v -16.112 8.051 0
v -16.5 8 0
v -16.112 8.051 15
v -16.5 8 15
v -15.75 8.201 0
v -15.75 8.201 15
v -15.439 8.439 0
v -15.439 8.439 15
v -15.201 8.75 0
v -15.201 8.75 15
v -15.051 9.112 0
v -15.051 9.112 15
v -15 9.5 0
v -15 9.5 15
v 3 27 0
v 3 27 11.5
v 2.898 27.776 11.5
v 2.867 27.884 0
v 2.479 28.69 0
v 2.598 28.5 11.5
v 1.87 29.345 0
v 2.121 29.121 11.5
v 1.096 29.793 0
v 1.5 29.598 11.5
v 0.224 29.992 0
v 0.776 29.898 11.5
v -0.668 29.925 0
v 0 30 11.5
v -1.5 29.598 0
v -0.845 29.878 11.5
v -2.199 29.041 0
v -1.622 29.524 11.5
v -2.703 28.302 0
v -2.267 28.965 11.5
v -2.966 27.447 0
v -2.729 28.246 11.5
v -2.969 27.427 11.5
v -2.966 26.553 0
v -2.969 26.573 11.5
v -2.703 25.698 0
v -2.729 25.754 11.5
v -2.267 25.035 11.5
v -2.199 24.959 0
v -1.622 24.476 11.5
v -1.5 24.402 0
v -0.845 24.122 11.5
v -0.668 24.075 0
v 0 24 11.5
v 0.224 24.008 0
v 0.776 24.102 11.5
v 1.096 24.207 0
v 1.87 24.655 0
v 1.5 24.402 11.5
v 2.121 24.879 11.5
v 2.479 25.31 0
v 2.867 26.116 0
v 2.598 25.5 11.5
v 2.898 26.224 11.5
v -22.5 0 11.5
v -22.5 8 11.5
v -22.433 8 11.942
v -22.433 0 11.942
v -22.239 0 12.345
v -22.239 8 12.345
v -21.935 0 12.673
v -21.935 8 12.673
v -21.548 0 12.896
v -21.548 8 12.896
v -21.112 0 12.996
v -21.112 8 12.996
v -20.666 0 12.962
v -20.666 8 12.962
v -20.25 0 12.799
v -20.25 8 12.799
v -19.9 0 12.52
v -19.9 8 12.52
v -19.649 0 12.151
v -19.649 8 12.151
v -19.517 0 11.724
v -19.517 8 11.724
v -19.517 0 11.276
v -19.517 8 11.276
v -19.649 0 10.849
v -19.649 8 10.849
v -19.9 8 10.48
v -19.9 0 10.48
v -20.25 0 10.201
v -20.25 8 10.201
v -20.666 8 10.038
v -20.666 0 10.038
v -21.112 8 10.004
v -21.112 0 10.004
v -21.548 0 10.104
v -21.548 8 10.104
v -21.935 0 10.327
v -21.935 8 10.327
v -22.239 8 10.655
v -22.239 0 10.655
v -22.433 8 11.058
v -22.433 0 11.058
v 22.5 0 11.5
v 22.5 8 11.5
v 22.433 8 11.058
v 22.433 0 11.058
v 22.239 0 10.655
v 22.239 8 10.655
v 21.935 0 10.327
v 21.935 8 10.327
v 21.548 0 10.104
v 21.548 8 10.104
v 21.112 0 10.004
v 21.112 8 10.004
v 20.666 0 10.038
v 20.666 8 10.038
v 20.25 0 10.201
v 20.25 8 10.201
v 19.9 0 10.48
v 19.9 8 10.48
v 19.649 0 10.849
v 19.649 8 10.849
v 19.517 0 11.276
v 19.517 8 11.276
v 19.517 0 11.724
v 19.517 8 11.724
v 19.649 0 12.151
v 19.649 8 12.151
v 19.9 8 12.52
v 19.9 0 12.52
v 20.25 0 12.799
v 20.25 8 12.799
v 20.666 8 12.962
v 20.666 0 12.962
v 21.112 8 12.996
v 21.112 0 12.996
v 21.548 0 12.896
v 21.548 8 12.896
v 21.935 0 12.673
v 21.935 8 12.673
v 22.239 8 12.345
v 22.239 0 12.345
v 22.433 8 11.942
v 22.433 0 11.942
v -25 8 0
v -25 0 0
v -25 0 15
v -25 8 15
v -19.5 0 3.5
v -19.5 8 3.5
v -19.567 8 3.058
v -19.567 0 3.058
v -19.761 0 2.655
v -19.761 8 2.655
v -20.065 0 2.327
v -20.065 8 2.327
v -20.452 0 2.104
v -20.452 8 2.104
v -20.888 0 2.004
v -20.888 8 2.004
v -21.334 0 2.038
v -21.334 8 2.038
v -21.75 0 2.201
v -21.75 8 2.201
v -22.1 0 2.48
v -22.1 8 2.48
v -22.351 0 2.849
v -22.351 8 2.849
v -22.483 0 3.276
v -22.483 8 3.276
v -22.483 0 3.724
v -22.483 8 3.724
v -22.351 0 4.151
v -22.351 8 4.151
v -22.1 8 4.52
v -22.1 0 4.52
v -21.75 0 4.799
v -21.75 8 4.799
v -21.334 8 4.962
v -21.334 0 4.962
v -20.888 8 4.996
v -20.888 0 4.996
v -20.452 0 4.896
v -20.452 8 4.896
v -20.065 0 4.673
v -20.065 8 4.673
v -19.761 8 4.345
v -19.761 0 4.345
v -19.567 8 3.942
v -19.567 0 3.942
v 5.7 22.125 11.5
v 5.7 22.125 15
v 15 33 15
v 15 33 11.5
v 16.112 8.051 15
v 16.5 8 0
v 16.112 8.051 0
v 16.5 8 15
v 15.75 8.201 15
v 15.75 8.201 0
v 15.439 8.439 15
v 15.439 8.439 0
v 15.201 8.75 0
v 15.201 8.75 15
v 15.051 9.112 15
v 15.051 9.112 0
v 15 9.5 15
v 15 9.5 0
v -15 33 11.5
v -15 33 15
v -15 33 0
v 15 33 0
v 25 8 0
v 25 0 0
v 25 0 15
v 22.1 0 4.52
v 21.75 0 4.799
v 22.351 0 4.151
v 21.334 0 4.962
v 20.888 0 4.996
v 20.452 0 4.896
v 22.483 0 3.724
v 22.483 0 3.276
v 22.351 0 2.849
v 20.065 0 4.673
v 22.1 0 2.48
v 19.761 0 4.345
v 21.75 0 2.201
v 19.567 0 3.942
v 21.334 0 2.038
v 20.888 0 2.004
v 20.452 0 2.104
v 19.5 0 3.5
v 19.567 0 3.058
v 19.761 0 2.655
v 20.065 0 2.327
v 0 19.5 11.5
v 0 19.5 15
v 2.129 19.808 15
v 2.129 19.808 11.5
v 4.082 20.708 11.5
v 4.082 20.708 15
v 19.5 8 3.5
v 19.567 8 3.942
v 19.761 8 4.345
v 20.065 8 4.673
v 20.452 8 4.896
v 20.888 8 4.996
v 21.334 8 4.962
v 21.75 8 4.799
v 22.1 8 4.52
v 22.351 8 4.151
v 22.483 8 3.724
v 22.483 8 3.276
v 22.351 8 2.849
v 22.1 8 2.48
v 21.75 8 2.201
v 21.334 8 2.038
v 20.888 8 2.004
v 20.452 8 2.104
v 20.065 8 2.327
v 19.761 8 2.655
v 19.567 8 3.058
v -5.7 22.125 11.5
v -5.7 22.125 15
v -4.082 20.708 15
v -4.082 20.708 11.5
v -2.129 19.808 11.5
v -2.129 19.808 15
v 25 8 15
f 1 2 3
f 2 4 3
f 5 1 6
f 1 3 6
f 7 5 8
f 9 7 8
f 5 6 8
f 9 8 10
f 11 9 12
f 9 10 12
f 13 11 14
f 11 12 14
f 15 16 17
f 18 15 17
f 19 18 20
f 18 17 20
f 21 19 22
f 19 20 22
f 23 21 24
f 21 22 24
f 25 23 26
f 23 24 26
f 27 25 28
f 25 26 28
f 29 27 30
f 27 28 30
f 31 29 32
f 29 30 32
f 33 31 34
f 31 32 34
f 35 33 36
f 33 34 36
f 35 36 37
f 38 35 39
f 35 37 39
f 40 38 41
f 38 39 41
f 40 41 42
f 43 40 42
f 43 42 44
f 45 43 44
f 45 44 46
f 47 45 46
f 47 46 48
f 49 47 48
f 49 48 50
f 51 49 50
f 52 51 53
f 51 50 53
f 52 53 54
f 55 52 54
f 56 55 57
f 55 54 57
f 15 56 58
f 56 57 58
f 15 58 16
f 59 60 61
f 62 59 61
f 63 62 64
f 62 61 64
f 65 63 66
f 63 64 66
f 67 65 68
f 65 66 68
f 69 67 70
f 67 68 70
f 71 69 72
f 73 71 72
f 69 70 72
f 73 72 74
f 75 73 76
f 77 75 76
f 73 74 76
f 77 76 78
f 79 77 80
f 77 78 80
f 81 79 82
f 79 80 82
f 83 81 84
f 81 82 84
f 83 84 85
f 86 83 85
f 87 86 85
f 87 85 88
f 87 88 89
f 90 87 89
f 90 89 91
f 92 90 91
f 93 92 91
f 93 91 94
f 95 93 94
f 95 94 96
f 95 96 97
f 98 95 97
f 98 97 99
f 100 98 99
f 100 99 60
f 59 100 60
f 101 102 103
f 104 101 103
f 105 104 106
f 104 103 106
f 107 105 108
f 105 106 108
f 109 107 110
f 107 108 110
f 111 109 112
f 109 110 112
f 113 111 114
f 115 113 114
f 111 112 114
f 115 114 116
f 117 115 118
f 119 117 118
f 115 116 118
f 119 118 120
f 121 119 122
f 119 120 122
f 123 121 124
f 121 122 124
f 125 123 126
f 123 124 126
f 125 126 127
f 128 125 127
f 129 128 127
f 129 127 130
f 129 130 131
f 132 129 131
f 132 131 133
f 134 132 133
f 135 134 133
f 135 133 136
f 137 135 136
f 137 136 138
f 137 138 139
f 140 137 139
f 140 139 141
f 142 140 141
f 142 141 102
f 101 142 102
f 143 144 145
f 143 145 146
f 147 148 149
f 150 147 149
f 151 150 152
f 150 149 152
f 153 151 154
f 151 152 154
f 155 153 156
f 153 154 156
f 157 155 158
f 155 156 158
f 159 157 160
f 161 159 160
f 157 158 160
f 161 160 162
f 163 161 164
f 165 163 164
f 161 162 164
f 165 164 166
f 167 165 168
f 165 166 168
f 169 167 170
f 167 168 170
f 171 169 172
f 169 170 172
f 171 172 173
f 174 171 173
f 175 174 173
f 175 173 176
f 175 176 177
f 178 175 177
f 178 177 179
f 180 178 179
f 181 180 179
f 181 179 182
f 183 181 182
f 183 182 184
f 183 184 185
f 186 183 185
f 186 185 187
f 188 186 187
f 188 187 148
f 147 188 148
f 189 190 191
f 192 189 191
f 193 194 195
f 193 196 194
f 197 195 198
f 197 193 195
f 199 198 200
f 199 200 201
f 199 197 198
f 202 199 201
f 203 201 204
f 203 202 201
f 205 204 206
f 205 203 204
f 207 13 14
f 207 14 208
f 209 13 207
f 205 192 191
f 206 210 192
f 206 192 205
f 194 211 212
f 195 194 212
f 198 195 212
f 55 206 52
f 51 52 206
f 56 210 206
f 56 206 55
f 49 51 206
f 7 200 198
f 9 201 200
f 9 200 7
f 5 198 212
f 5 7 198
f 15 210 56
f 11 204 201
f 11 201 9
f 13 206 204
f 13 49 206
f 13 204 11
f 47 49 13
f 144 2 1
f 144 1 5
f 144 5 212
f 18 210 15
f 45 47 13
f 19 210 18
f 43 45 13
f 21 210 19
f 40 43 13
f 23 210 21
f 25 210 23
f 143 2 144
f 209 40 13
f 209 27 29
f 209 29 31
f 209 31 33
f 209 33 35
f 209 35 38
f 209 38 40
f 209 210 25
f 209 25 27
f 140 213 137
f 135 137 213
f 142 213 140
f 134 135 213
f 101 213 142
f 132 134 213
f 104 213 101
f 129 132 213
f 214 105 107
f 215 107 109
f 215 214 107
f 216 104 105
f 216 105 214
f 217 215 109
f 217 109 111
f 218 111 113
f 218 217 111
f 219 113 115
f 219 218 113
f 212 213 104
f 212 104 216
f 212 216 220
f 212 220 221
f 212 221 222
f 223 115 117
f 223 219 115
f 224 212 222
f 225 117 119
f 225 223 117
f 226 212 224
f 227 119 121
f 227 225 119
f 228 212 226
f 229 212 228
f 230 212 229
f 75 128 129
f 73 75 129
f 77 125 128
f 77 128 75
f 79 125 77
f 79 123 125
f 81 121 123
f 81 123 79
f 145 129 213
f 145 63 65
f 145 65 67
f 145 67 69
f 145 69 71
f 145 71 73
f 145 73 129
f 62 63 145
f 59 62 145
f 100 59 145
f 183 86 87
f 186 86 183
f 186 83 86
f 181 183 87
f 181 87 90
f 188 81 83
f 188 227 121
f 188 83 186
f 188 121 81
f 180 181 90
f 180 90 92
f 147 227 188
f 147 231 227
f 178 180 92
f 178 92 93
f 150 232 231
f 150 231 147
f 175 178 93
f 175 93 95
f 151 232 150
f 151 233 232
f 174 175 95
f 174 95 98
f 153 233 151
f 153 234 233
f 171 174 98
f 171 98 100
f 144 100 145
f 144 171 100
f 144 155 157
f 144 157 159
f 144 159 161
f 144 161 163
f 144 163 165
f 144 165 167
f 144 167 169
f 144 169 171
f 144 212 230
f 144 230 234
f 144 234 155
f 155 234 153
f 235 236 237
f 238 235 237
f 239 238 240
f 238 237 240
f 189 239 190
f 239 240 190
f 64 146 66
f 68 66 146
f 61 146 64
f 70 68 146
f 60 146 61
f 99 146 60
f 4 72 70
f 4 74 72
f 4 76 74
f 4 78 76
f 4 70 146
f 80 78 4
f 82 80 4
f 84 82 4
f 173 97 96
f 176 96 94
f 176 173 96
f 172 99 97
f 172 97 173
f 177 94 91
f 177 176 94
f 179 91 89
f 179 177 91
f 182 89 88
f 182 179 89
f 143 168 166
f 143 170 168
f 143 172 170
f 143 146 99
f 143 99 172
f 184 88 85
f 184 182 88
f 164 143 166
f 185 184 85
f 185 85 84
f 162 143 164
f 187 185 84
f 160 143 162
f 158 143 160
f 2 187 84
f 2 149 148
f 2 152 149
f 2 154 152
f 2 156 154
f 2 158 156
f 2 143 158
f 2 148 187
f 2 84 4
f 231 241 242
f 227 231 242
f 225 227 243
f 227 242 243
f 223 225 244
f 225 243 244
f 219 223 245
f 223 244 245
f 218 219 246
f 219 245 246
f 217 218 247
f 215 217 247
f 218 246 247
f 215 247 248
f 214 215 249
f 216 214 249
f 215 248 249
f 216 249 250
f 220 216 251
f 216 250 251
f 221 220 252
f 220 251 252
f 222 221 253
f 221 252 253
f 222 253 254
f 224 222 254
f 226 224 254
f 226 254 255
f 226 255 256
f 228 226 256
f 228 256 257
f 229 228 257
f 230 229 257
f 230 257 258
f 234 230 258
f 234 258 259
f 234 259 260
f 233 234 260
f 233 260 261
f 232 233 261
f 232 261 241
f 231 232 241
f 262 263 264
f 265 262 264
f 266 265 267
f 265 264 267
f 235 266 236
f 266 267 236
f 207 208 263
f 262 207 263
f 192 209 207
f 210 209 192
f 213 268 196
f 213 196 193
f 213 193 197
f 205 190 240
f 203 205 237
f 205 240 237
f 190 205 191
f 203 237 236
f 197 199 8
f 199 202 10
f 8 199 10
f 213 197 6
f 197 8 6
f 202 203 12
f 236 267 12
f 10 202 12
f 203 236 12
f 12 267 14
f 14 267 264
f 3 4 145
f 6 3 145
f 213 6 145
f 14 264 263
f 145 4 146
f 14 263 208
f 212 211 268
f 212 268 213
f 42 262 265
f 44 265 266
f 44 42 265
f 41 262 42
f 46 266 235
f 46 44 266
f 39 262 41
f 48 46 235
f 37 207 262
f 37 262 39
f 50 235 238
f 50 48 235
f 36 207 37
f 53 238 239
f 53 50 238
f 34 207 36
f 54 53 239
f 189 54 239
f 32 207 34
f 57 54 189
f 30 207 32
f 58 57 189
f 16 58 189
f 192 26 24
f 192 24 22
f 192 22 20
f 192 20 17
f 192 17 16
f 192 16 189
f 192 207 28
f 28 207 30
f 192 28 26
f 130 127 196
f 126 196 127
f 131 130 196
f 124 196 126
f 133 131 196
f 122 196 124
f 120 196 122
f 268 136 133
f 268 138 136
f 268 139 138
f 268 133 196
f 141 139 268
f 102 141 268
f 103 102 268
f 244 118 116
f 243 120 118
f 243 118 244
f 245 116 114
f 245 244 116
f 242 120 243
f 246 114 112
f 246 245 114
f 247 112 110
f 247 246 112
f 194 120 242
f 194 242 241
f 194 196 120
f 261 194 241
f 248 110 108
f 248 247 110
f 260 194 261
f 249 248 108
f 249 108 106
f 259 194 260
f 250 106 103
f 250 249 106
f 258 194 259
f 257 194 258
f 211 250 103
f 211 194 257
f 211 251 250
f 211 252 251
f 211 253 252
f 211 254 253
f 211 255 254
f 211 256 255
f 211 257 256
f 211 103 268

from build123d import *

# Parameters (mm, degrees)
EXTRUDE_1_DEPTH     = 15
SKETCH_2_R          = 3
CUT_EXTRUDE_1_DEPTH = 45.034077713
SKETCH_3_R          = 1.5
CUT_EXTRUDE_2_DEPTH = 39.405728739
FILLET_1_R          = 1.5
CUT_EXTRUDE_3_DEPTH = 3.5


with BuildPart() as part:
    # 草图1 → 凸台-拉伸1 (new body)
    with BuildSketch(Plane.XY):
        Polygon((25, 0), (-25, 0), (-25, 8), (-15, 8), (-15, 33), (15, 33), (15, 8), (25, 8), align=None)
    extrude(amount=EXTRUDE_1_DEPTH)

    # 草图2 → 切除-拉伸1 (cut, through all)
    with BuildSketch(Plane.XY.offset(15)):
        with Locations((0, 27)):
            Circle(SKETCH_2_R)
    extrude(amount=-CUT_EXTRUDE_1_DEPTH, mode=Mode.SUBTRACT)

    # 草图3 → 切除-拉伸2 (cut, through all)
    with BuildSketch(Plane(origin=(0, 8, 0), x_dir=(1, 0, 0), z_dir=(0, 1, 0))):
        with Locations(Location((21, -3.5, 0), (0, 0, 180))):
            Circle(SKETCH_3_R)
        with Locations((21, -11.5)):
            Circle(SKETCH_3_R)
        with Locations(Location((-21, -11.5, 0), (0, 0, 180))):
            Circle(SKETCH_3_R)
        with Locations((-21, -3.5)):
            Circle(SKETCH_3_R)
    extrude(amount=-CUT_EXTRUDE_2_DEPTH, mode=Mode.SUBTRACT)

    # 圆角1
    fillet_1_edges = [part.edges().sort_by_distance(p)[0] for p in [
        (-15, 8, 7.5),
        (15, 8, 7.5),
    ]]
    fillet(fillet_1_edges, radius=FILLET_1_R)

    # 草图4 → 切除-拉伸3 (cut)
    with BuildSketch(Plane.XY.offset(15)):
        with BuildLine():
            Line((-15, 33), (-5.699842762, 22.125393094))
            ThreePointArc((-5.699842762, 22.125393094), (-7.45476136, 27.822516302), (-4.5, 33))
            Line((-4.5, 33), (-15, 33))
        make_face()
        with BuildLine():
            ThreePointArc((-5.699842762, 22.125393094), (-3.137710009, 20.1878949), (0, 19.5))
            Line((0, 19.5), (0, 24))
            ThreePointArc((0, 24), (-3, 27), (0, 30))
            Line((0, 30), (0, 33))
            Line((0, 33), (-4.5, 33))
            ThreePointArc((-4.5, 33), (-7.45476136, 27.822516302), (-5.699842762, 22.125393094))
        make_face()
        with BuildLine():
            Line((0, 24), (0, 19.5))
            ThreePointArc((0, 19.5), (3.137710009, 20.1878949), (5.699842762, 22.125393094))
            ThreePointArc((5.699842762, 22.125393094), (7.035581736, 24.401810315), (7.5, 27))
            ThreePointArc((7.5, 27), (6.708203932, 30.354101966), (4.5, 33))
            Line((4.5, 33), (0, 33))
            Line((0, 33), (0, 30))
            ThreePointArc((0, 30), (2.121320344, 29.121320344), (3, 27))
            ThreePointArc((3, 27), (2.121320344, 24.878679656), (0, 24))
        make_face()
        with BuildLine():
            ThreePointArc((7.5, 27), (7.035581736, 24.401810315), (5.699842762, 22.125393094))
            Line((5.699842762, 22.125393094), (15, 33))
            Line((15, 33), (4.5, 33))
            ThreePointArc((4.5, 33), (6.708203932, 30.354101966), (7.5, 27))
        make_face()
    extrude(amount=-CUT_EXTRUDE_3_DEPTH, mode=Mode.SUBTRACT)


solid = part.part
